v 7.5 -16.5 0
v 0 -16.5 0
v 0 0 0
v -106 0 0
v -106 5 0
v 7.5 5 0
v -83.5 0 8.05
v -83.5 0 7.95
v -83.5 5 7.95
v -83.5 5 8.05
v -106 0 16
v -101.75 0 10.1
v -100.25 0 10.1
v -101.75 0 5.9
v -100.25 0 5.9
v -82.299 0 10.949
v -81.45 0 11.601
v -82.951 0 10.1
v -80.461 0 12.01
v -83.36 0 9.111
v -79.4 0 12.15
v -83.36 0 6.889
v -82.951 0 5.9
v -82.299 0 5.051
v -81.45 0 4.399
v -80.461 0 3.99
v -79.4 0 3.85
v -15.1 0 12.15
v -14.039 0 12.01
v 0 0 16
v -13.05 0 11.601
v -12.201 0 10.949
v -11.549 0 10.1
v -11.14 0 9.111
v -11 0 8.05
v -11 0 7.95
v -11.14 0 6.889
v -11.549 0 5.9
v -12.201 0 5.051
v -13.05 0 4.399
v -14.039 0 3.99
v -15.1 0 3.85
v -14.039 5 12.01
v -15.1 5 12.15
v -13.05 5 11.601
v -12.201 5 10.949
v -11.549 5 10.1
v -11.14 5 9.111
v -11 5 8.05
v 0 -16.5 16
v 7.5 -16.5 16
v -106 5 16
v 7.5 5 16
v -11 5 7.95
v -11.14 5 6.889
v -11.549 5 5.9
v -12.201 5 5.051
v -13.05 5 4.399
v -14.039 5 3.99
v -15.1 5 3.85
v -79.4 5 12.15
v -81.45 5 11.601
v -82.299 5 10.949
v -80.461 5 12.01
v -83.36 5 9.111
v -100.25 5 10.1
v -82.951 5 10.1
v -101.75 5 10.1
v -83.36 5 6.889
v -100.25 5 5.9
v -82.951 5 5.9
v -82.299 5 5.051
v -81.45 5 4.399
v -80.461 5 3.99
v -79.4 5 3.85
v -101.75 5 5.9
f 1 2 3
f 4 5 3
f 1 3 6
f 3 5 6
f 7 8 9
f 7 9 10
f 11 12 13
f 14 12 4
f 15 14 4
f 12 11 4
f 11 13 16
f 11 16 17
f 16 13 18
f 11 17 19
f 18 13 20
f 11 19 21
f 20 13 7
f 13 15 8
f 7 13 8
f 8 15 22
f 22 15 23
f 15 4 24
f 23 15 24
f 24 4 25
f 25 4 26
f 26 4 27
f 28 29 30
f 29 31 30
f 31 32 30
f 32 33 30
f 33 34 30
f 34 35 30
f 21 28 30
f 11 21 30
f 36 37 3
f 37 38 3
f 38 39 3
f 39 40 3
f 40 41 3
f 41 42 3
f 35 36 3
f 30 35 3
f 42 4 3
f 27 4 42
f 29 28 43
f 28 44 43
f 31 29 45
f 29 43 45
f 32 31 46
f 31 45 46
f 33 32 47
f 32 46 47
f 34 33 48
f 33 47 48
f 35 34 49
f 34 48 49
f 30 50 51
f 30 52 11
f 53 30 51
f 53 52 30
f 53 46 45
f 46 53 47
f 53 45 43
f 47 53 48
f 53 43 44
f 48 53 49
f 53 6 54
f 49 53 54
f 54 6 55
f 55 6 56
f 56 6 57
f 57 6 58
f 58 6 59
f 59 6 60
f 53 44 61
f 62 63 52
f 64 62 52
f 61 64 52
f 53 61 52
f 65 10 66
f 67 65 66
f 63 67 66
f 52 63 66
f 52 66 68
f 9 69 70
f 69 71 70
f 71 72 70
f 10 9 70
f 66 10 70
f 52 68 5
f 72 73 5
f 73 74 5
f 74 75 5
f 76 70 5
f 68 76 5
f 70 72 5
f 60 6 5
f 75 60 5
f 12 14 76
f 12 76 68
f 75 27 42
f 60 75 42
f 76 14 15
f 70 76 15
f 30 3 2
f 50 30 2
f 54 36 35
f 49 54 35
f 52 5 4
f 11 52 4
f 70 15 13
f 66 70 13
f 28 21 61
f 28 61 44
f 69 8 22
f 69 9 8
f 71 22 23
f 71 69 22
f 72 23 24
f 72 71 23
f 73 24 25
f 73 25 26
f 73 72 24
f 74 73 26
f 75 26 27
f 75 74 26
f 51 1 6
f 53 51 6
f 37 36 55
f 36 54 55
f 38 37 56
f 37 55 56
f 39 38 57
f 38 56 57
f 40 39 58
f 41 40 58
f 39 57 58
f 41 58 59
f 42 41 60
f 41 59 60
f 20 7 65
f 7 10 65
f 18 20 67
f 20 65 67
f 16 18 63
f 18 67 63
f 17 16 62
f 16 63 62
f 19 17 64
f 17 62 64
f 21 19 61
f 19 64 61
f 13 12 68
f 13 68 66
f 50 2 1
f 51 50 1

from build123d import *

# Parameters (mm, degrees)
EXTRUDE_1_DEPTH     = 16
SKETCH_2_W          = 1.5
SKETCH_2_H          = 4.2
SKETCH_2_W_2        = 72.5
SKETCH_2_H_2        = 8.3
CUT_EXTRUDE_1_DEPTH = 109.463127375
FILLET_1_R          = 4.1


with BuildPart() as part:
    # 스케치1 → 보스-돌출1 (new body)
    with BuildSketch(Plane.XY):
        Polygon((-106, 0), (0, 0), (0, -16.5), (7.5, -16.5), (7.5, 5), (-106, 5), align=None)
    extrude(amount=EXTRUDE_1_DEPTH)

    # 스케치2 → 컷-돌출1 (cut, through all)
    with BuildSketch(Plane.XZ):
        with Locations((-101, 8)):
            Rectangle(SKETCH_2_W, SKETCH_2_H)
        with Locations((-47.25, 8)):
            Rectangle(SKETCH_2_W_2, SKETCH_2_H_2)
    extrude(amount=-CUT_EXTRUDE_1_DEPTH, mode=Mode.SUBTRACT)

    # 필렛1
    fillet_1_edges = [part.edges().sort_by_distance(p)[0] for p in [
        (-83.5, 2.5, 3.85),
        (-83.5, 2.5, 12.15),
        (-11, 2.5, 12.15),
        (-11, 2.5, 3.85),
    ]]
    fillet(fillet_1_edges, radius=FILLET_1_R)


solid = part.part
